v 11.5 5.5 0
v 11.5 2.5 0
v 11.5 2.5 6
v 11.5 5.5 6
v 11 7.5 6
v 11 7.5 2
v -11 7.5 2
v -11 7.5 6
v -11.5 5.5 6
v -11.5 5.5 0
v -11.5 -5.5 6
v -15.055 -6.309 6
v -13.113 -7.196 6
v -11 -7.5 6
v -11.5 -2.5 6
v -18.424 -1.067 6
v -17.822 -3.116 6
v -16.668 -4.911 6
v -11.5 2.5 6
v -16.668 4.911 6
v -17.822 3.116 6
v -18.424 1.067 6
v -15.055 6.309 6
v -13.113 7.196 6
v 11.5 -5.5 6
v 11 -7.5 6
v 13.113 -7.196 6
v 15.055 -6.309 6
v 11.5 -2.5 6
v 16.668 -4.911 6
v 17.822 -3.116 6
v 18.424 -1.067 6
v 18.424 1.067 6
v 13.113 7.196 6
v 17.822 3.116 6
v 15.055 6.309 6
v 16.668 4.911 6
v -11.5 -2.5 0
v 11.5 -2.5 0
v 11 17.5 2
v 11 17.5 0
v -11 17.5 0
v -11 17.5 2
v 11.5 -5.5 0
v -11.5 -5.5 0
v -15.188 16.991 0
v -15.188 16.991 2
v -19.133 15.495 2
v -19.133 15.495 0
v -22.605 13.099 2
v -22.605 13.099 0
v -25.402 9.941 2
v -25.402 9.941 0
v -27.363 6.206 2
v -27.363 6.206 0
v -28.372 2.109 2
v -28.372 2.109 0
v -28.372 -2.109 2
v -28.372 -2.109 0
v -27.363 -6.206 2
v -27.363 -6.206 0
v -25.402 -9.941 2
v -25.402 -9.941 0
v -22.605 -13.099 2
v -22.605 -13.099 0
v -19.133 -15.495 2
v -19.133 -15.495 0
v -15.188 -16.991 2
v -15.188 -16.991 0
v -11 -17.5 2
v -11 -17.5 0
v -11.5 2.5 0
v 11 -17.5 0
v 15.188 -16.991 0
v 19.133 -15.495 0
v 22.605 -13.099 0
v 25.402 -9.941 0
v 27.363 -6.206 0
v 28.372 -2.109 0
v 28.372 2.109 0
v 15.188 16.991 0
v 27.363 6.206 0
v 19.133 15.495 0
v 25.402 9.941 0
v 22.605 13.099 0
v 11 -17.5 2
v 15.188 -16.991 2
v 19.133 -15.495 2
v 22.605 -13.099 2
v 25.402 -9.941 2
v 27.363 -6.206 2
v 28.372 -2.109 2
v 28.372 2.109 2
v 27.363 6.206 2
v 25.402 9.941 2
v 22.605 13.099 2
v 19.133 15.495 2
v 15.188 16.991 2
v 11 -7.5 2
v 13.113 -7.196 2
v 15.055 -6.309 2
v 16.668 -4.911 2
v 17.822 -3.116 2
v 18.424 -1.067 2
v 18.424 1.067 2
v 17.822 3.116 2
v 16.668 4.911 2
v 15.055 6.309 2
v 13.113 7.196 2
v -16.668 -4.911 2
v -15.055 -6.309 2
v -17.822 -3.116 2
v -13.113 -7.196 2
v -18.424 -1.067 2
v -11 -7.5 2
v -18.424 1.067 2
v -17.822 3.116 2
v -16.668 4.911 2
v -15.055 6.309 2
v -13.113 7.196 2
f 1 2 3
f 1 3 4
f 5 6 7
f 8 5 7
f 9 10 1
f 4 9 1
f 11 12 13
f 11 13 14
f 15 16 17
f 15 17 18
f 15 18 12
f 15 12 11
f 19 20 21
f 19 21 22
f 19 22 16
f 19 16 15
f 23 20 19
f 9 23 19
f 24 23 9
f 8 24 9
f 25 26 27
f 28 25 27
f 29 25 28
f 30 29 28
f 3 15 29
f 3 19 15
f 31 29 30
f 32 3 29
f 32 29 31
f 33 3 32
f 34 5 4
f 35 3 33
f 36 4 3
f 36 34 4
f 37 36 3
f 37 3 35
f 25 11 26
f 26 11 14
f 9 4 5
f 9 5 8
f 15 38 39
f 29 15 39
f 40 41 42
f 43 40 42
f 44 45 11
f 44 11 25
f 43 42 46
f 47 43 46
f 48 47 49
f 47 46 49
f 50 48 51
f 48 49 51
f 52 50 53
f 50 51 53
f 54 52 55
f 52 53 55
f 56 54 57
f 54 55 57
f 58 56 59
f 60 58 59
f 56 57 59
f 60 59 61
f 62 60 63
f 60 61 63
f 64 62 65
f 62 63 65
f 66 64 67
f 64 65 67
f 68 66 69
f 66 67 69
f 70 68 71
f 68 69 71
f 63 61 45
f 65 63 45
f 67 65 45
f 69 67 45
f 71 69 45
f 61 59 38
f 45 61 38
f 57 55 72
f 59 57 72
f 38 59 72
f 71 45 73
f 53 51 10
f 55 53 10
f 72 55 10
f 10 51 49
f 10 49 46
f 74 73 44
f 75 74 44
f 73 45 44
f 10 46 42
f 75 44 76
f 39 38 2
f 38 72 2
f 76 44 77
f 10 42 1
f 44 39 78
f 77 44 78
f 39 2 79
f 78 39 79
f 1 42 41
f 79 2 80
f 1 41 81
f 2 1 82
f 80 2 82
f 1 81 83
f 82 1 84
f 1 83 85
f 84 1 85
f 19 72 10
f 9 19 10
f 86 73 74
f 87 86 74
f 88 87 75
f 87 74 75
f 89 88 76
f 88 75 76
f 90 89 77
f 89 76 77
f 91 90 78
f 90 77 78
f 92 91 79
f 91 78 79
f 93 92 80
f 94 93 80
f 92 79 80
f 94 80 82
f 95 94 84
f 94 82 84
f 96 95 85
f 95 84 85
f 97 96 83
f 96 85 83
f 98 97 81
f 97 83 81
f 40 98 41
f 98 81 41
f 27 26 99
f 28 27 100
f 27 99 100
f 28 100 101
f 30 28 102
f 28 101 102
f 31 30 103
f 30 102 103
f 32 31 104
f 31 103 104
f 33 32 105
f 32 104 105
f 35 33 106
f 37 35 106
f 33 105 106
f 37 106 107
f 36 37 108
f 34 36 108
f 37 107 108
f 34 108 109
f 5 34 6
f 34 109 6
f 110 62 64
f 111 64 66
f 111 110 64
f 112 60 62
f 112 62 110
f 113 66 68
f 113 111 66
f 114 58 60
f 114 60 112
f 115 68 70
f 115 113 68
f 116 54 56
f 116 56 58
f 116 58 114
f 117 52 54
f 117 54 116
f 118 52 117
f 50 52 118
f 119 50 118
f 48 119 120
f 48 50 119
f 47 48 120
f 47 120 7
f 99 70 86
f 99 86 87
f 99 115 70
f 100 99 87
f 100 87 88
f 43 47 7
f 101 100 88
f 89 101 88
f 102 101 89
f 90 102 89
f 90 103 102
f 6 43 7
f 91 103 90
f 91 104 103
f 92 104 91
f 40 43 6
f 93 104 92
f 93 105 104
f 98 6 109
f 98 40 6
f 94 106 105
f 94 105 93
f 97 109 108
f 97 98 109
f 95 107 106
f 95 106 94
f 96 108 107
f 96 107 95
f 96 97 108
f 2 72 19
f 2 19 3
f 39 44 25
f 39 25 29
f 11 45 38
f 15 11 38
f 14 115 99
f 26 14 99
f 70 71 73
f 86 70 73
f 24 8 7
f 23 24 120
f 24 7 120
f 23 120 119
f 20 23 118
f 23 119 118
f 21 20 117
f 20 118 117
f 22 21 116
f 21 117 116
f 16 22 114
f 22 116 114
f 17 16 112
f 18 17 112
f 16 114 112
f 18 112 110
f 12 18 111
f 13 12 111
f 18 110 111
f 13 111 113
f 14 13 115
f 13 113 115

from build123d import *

# Parameters (mm, degrees)
F0_W     = 23
F0_H     = 3
F1_DEPTH = 2
F2_DEPTH = 6


with BuildPart() as f1:
    # F0 (on Top) → F1 (new body)
    with BuildSketch(Plane.XY):
        with BuildLine():
            Line((-11, -7.5), (11, -7.5))
            ThreePointArc((11, -7.5), (18.5, 0), (11, 7.5))
            Line((11, 7.5), (-11, 7.5))
            ThreePointArc((-11, 7.5), (-18.5, 0), (-11, -7.5))
        make_face()
        with Locations((0, -4)):
            Rectangle(F0_W, F0_H, mode=Mode.SUBTRACT)
        with Locations((0, 4)):
            Rectangle(F0_W, F0_H, mode=Mode.SUBTRACT)
        with BuildLine():
            Line((11, 17.5), (-11, 17.5))
            ThreePointArc((-11, 17.5), (-28.5, 0), (-11, -17.5))
            Line((-11, -17.5), (11, -17.5))
            ThreePointArc((11, -17.5), (28.5, 0), (11, 17.5))
        make_face()
        with BuildLine():
            ThreePointArc((11, 7.5), (18.5, 0), (11, -7.5))
            Line((11, -7.5), (-11, -7.5))
            ThreePointArc((-11, -7.5), (-18.5, 0), (-11, 7.5))
            Line((-11, 7.5), (11, 7.5))
        make_face(mode=Mode.SUBTRACT)
    extrude(amount=F1_DEPTH)

    # F0 (on Top) → F2 (join)
    with BuildSketch(Plane.XY):
        with BuildLine():
            Line((-11, -7.5), (11, -7.5))
            ThreePointArc((11, -7.5), (18.5, 0), (11, 7.5))
            Line((11, 7.5), (-11, 7.5))
            ThreePointArc((-11, 7.5), (-18.5, 0), (-11, -7.5))
        make_face()
        with Locations((0, -4)):
            Rectangle(F0_W, F0_H, mode=Mode.SUBTRACT)
        with Locations((0, 4)):
            Rectangle(F0_W, F0_H, mode=Mode.SUBTRACT)
    extrude(amount=F2_DEPTH)


solid = f1.part
